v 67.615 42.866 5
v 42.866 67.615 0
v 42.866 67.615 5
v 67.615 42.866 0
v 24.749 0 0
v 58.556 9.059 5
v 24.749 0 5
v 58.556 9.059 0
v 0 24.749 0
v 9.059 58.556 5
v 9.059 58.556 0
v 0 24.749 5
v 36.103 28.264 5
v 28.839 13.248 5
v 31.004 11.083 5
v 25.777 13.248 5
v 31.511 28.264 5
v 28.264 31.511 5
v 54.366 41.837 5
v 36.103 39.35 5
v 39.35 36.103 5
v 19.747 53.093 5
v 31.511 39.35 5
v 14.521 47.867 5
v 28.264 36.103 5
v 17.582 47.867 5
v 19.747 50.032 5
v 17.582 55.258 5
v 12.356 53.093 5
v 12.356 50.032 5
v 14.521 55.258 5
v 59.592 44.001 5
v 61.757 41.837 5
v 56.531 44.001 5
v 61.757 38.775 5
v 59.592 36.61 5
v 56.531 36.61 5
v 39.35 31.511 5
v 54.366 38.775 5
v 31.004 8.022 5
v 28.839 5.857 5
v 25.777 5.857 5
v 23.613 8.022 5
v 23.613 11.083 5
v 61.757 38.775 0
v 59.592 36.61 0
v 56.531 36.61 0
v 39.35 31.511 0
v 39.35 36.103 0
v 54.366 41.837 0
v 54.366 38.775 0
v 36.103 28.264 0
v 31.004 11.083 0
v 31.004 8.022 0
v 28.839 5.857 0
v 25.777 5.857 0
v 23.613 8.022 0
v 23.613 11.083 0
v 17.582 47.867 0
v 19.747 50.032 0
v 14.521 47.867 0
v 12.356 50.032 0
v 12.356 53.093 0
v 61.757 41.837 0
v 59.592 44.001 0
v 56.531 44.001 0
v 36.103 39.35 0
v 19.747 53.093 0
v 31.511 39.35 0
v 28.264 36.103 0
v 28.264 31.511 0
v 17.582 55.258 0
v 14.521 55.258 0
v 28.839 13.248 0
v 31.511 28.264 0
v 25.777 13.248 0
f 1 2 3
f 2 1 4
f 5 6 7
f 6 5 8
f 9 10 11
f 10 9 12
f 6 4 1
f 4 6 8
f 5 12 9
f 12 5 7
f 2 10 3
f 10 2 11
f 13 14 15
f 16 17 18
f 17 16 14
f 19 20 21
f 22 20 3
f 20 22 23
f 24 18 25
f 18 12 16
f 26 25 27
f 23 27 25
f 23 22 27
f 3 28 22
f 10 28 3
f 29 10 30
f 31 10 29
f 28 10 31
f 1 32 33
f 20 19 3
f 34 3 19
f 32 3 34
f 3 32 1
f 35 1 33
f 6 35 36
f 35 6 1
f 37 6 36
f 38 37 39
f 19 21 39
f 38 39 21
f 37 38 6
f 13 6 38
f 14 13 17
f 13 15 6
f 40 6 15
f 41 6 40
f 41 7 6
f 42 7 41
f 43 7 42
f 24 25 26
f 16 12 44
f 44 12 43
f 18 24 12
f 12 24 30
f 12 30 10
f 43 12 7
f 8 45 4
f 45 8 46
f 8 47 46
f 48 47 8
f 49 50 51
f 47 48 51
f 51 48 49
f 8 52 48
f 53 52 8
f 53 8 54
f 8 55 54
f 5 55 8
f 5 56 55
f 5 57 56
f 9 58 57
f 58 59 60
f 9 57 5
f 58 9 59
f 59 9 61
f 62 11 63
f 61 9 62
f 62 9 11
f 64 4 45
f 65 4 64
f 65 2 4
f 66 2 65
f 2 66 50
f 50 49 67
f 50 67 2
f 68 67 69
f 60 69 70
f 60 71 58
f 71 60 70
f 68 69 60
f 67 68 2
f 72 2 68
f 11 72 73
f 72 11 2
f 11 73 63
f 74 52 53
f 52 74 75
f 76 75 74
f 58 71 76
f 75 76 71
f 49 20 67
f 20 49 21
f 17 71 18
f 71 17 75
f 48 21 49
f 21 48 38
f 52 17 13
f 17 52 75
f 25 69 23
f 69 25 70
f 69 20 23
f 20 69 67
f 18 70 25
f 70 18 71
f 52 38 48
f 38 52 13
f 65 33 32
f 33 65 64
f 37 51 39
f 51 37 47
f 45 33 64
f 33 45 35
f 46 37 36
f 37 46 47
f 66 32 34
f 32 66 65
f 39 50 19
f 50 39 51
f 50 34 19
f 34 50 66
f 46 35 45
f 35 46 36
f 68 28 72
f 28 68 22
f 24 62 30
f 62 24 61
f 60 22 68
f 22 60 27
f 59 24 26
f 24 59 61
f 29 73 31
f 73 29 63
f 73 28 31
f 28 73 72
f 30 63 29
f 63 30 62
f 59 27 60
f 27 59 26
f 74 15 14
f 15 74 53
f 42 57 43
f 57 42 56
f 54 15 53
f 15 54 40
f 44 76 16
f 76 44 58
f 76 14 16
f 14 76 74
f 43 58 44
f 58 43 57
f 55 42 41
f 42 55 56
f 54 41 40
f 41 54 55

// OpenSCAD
$fn = 32;

// ----------------------------------------------------------------------
// Polygon plate: 6-gon R35, 3 bolt windows
// ----------------------------------------------------------------------

// --- parameters (mm) ---
sides = 6;                // number of polygon sides
plate_r = 35;             // circumscribed radius of the polygon
bore_r = 6;               // centre bore radius
bolts = 3;                // number of bolt windows
ring_r = 25.11;           // bolt-circle radius
bolt_r = 4;               // bolt window radius
plate_t = 5;              // plate thickness, Z (extrusion height)

plate_d = 2 * plate_r;  // circumscribed diameter
bore_d = 2 * bore_r;  // centre bore diameter
bolt_d = 2 * bolt_r;  // bolt window diameter
ring_d = 2 * ring_r;  // bolt-circle diameter

profile = [[67.615, 42.866], [42.866, 67.615], [9.059, 58.556], [0, 24.749], [24.749, 0], [58.556, 9.059]];  // primary outline, 6 points, counter clockwise
void_1 = [[39.35, 36.103], [36.103, 39.35], [31.511, 39.35], [28.264, 36.103], [28.264, 31.511], [31.511, 28.264], [36.103, 28.264], [39.35, 31.511]];  // centre bore, 8 points
void_2 = [[61.757, 41.837], [59.592, 44.001], [56.531, 44.001], [54.366, 41.837], [54.366, 38.775], [56.531, 36.61], [59.592, 36.61], [61.757, 38.775]];  // bolt window 1, 8 points
void_3 = [[19.747, 53.093], [17.582, 55.258], [14.521, 55.258], [12.356, 53.093], [12.356, 50.032], [14.521, 47.867], [17.582, 47.867], [19.747, 50.032]];  // bolt window 2, 8 points
void_4 = [[31.004, 11.083], [28.839, 13.248], [25.777, 13.248], [23.613, 11.083], [23.613, 8.022], [25.777, 5.857], [28.839, 5.857], [31.004, 8.022]];  // bolt window 3, 8 points

// --- the one profile operation ---
difference() {
  linear_extrude(height = plate_t) polygon(points = profile);
  translate([0, 0, -1])
    linear_extrude(height = plate_t + 2) polygon(points = void_1);
  translate([0, 0, -1])
    linear_extrude(height = plate_t + 2) polygon(points = void_2);
  translate([0, 0, -1])
    linear_extrude(height = plate_t + 2) polygon(points = void_3);
  translate([0, 0, -1])
    linear_extrude(height = plate_t + 2) polygon(points = void_4);
}
